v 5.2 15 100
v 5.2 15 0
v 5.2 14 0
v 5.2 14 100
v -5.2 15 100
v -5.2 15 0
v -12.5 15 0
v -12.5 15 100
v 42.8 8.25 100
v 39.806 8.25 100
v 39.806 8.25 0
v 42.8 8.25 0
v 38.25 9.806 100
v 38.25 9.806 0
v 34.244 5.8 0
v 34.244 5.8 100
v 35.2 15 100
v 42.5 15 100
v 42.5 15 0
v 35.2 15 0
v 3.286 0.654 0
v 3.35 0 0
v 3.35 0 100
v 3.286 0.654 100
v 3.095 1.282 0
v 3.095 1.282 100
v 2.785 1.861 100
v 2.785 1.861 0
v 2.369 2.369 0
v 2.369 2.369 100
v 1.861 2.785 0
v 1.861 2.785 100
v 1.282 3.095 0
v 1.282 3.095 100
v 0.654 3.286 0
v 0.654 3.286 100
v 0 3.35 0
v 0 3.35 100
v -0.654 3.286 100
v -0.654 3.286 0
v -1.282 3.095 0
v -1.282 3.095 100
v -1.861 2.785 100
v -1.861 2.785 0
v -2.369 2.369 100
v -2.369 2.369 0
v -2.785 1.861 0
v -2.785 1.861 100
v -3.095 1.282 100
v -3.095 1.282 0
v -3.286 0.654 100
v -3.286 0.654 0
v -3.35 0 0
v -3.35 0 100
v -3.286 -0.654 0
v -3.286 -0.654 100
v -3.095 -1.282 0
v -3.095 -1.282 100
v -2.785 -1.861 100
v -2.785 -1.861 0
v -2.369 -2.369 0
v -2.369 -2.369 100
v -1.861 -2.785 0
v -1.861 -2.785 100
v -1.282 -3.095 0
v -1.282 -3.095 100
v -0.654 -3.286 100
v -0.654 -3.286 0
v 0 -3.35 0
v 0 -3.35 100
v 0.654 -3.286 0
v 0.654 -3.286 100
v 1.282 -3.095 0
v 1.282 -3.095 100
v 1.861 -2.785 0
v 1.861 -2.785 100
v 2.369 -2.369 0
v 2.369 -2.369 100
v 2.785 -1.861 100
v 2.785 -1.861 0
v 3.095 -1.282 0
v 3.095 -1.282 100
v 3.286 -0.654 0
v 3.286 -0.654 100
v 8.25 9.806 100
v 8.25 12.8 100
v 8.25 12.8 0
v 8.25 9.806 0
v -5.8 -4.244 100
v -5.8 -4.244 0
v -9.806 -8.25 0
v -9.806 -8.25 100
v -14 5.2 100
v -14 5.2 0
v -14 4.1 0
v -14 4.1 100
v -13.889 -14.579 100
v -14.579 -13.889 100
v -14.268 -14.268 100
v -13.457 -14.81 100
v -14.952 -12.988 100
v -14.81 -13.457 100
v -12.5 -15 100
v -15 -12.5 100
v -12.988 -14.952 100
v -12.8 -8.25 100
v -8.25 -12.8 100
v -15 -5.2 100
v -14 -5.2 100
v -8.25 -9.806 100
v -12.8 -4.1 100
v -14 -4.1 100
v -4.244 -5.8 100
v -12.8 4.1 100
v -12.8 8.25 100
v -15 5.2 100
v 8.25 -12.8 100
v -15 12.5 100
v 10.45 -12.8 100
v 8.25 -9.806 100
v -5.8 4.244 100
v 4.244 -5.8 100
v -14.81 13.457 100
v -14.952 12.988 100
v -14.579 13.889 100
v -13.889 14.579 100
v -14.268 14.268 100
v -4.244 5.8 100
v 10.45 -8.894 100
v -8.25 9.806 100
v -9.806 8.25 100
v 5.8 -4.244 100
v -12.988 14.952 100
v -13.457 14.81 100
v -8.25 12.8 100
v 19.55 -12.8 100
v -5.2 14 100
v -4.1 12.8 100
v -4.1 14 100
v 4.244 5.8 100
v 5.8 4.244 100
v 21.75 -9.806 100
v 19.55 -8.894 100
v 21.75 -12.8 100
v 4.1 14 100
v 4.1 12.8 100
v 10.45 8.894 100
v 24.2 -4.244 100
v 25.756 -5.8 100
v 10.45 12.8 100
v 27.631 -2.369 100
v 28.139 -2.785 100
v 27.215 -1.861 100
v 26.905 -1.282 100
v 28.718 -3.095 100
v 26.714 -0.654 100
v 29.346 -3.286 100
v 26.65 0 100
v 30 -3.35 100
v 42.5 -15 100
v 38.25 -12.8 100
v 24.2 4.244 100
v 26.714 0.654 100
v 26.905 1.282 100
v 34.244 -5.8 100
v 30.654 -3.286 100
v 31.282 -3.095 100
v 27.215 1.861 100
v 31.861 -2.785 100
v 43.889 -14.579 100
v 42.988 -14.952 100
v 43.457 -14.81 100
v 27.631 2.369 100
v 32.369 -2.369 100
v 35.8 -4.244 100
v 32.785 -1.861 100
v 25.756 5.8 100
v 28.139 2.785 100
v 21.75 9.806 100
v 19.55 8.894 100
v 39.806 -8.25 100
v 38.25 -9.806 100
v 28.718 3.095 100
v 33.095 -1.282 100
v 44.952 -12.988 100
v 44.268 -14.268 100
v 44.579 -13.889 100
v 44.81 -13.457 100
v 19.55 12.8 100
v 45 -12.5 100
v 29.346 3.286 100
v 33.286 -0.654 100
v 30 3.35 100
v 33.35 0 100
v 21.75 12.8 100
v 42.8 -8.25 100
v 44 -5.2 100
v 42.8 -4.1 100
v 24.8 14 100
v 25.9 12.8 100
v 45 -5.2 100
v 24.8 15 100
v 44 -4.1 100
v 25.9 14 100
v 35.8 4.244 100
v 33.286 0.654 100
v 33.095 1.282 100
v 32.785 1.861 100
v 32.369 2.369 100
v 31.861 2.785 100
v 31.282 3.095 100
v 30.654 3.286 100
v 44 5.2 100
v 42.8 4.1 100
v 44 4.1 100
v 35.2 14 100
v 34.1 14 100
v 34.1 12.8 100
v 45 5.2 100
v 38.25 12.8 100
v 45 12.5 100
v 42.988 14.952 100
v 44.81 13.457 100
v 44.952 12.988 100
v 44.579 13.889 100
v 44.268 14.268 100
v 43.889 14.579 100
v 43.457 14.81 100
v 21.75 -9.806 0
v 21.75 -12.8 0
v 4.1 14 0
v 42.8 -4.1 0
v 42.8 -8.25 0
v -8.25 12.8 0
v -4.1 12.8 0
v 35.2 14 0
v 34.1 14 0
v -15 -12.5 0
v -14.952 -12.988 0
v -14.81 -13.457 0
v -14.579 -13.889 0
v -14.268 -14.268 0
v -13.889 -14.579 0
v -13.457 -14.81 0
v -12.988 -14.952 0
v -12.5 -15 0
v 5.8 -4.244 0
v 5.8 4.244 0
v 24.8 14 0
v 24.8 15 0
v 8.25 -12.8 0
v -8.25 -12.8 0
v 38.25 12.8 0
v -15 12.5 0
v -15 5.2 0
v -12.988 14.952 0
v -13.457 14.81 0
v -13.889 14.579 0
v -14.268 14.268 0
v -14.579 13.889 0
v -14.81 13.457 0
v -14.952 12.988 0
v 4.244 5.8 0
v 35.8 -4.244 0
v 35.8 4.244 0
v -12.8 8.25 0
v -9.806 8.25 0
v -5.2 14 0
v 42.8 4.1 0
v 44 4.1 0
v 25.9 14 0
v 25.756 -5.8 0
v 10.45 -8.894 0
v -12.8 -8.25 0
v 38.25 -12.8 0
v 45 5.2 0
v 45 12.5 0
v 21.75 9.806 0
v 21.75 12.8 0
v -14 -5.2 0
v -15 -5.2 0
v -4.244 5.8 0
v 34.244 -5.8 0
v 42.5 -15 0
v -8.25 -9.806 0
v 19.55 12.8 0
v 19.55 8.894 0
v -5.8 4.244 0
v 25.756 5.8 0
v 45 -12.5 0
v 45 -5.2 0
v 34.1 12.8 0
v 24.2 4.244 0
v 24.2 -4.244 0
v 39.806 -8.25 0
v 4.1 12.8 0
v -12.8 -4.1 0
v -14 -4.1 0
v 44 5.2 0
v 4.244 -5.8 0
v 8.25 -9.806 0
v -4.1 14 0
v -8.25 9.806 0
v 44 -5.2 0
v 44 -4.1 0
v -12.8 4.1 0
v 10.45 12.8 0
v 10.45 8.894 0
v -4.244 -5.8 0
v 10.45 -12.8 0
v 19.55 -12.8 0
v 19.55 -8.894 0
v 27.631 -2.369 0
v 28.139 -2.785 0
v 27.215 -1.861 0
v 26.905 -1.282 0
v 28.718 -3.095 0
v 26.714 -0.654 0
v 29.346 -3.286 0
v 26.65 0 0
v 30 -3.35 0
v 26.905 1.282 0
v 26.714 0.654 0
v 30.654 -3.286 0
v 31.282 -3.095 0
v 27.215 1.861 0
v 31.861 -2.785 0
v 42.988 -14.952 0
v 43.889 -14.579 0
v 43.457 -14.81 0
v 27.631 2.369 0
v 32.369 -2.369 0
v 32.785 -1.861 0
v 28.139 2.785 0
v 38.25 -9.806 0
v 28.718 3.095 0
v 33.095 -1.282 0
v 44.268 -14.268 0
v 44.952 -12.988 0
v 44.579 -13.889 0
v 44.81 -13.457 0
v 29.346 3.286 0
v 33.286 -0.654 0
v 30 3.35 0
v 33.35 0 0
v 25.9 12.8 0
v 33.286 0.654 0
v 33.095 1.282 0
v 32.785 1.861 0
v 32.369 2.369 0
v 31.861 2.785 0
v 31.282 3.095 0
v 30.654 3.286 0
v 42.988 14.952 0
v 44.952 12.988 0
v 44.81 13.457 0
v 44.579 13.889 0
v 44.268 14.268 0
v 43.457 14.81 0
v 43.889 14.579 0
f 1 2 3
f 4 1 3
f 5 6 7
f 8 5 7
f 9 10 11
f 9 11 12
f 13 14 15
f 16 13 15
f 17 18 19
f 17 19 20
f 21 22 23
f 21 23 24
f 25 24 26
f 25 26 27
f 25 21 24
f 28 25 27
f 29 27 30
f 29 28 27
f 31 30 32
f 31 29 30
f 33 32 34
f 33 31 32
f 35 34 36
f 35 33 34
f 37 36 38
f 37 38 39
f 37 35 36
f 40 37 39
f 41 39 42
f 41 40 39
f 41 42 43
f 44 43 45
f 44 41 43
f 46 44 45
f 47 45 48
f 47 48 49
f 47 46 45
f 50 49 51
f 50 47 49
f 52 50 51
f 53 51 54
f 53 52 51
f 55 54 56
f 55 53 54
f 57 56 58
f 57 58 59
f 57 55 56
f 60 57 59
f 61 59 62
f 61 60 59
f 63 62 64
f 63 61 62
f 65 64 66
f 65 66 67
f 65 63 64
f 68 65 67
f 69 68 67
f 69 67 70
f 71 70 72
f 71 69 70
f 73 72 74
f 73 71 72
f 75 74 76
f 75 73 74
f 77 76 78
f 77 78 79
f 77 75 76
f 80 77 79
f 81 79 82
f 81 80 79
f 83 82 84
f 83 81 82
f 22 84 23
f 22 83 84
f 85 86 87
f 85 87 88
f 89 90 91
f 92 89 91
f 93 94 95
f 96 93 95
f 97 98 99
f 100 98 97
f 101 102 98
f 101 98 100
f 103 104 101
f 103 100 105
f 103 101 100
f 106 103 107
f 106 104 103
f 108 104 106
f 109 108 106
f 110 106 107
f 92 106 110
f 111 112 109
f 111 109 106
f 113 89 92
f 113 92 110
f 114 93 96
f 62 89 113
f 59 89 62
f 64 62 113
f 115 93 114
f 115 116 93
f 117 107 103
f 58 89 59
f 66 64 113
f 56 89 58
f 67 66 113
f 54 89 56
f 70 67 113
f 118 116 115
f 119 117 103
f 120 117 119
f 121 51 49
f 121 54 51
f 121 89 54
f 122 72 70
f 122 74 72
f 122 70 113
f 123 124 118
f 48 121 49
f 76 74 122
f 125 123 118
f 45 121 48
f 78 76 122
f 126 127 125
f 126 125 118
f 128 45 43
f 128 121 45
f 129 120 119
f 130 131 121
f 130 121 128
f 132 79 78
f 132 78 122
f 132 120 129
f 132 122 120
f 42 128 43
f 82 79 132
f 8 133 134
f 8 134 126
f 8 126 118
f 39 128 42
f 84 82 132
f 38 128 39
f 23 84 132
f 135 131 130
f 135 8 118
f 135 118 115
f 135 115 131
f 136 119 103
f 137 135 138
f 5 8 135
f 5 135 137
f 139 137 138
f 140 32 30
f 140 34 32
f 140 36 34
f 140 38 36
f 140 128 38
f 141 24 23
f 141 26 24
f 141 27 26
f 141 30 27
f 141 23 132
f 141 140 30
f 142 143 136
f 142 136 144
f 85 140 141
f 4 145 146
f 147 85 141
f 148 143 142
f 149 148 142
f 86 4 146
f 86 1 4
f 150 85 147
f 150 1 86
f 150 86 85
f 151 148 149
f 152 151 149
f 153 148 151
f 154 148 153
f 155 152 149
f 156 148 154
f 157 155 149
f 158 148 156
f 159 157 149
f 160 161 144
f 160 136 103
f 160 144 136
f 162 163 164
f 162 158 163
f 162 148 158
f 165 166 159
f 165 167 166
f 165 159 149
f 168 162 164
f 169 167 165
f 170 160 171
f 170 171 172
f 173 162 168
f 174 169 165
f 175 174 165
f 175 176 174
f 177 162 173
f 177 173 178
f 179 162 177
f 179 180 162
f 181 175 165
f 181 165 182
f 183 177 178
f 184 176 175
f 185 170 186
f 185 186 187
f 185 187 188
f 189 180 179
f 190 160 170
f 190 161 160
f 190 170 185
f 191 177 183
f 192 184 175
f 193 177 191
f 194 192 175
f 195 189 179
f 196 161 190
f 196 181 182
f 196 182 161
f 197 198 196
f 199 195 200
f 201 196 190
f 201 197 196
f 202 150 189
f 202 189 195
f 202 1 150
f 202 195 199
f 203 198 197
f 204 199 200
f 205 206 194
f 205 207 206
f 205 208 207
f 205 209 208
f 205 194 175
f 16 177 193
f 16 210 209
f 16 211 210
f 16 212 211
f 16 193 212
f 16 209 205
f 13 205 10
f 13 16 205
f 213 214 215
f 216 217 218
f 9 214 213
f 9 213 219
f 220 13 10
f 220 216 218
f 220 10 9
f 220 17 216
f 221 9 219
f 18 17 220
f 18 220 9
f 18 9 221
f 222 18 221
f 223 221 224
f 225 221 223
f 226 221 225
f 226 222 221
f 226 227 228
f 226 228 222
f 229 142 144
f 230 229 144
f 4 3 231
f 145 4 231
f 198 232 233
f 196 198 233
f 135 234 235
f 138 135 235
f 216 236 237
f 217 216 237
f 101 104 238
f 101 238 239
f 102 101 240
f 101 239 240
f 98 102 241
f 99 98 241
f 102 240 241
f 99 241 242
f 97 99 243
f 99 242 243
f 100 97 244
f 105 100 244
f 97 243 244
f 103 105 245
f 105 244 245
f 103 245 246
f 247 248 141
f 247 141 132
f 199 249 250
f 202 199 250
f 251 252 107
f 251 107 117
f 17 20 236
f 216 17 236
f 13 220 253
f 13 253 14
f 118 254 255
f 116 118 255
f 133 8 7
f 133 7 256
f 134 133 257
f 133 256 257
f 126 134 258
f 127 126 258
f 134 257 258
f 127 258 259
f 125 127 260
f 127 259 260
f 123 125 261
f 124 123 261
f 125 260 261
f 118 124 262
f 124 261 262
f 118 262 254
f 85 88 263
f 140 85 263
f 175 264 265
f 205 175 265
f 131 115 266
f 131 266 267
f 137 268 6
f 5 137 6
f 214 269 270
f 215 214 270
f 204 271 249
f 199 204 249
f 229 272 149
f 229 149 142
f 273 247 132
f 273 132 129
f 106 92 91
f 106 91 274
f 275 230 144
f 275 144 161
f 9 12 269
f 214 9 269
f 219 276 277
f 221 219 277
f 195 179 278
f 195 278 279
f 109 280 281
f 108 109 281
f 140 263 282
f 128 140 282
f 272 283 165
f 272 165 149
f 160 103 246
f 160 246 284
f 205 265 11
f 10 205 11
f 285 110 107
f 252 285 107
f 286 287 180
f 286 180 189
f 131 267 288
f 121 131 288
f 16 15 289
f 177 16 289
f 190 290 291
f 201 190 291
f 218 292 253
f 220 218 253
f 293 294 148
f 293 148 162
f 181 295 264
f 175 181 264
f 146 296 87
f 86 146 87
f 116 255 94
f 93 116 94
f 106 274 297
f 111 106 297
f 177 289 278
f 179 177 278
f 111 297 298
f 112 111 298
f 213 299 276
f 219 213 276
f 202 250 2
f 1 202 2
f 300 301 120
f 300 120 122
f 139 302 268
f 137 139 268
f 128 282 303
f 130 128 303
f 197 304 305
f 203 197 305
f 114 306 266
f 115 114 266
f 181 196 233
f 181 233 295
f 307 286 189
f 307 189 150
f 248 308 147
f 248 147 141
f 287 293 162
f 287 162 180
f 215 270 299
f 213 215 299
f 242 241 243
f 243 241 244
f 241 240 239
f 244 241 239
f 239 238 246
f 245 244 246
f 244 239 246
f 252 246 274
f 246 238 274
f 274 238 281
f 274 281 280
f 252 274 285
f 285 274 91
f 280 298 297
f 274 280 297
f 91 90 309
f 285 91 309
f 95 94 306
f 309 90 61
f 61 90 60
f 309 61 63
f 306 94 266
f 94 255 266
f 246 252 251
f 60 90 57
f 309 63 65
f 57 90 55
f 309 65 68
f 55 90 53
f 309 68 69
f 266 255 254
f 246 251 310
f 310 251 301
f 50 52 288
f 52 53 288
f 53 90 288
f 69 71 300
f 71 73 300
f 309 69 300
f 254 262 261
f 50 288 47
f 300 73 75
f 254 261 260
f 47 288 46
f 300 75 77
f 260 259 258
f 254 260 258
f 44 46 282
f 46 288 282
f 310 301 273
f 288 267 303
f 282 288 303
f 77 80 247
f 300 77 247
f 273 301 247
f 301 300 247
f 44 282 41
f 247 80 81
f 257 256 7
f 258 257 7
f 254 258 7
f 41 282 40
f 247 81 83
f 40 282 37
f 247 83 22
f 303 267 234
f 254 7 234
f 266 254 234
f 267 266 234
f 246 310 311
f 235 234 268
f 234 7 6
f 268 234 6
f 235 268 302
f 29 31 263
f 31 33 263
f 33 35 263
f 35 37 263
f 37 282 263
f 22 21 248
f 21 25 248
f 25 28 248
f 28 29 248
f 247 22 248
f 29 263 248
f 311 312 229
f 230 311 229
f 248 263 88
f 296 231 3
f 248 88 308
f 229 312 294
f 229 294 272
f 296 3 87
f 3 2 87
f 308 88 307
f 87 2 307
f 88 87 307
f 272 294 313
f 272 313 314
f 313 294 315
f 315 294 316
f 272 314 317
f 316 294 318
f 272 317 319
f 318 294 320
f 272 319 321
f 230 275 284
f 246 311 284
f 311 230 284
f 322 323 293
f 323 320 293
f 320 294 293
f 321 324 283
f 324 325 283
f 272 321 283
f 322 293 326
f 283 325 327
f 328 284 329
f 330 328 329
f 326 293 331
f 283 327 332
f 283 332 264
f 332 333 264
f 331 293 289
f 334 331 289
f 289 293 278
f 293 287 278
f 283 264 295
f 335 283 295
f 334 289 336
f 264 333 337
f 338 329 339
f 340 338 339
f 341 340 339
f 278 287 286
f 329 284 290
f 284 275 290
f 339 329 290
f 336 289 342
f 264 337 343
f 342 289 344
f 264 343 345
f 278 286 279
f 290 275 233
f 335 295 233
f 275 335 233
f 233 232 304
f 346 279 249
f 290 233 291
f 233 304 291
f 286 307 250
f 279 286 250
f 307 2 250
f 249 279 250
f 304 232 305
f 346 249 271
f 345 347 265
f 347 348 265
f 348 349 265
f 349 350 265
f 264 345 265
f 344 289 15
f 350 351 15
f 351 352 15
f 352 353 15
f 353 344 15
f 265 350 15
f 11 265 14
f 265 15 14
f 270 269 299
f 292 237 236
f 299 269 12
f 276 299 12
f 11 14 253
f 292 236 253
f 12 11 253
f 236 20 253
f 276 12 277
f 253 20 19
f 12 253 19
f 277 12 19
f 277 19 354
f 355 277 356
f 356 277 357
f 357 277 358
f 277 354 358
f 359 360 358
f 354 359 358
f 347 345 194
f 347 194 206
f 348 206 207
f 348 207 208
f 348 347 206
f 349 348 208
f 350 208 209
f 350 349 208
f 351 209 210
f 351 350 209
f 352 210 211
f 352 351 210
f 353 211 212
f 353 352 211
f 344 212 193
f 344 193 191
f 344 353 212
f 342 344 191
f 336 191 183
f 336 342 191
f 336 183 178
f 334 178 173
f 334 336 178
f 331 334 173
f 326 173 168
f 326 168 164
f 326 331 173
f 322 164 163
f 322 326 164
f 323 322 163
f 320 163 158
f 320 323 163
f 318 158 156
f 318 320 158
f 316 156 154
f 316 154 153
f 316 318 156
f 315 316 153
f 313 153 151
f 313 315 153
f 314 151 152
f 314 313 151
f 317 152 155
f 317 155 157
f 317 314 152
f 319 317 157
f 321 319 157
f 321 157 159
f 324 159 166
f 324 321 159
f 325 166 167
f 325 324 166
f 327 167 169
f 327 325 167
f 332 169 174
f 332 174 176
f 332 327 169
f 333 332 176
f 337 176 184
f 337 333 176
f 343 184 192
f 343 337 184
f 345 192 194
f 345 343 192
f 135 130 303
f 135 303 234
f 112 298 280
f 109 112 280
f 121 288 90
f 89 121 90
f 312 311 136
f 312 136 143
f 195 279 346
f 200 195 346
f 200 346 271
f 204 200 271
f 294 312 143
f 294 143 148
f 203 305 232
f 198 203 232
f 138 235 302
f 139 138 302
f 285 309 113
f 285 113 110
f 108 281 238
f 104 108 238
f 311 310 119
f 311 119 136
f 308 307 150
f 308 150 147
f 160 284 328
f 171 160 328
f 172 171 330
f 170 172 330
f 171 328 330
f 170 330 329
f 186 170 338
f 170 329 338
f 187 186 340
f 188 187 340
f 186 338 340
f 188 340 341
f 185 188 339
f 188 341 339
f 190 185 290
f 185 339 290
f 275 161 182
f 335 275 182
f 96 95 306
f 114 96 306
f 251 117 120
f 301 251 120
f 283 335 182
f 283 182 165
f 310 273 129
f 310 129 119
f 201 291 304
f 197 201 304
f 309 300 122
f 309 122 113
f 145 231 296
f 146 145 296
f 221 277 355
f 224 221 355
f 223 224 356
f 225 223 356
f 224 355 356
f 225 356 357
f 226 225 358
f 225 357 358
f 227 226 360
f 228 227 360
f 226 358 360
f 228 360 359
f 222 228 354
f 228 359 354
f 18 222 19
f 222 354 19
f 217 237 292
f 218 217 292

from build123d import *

# Parameters (mm, degrees)
SKETCH_1_R      = 3.35
EXTRUDE_1_DEPTH = 100


with BuildPart() as part:
    # 草图1 → 凸台-拉伸1 (new body)
    with BuildSketch(Plane.XY):
        with BuildLine():
            Line((-5.8, -4.244365081), (-9.805634919, -8.25))
            Line((-9.805634919, -8.25), (-12.8, -8.25))
            Line((-12.8, -8.25), (-12.8, -4.1))
            Line((-12.8, -4.1), (-14, -4.1))
            Line((-14, -4.1), (-14, -5.2))
            Line((-14, -5.2), (-15, -5.2))
            Line((-15, -5.2), (-15, -12.5))
            ThreePointArc((-15, -12.5), (-14.267766953, -14.267766953), (-12.5, -15))
            Line((-12.5, -15), (42.5, -15))
            ThreePointArc((42.5, -15), (44.267766953, -14.267766953), (45, -12.5))
            Line((45, -12.5), (45, -5.2))
            Line((45, -5.2), (44, -5.2))
            Line((44, -5.2), (44, -4.1))
            Line((44, -4.1), (42.8, -4.1))
            Line((42.8, -4.1), (42.8, -8.25))
            Line((42.8, -8.25), (39.805634919, -8.25))
            Line((39.805634919, -8.25), (35.8, -4.244365081))
            Line((35.8, -4.244365081), (35.8, 4.244365081))
            Line((35.8, 4.244365081), (39.805634919, 8.25))
            Line((39.805634919, 8.25), (42.8, 8.25))
            Line((42.8, 8.25), (42.8, 4.1))
            Line((42.8, 4.1), (44, 4.1))
            Line((44, 4.1), (44, 5.2))
            Line((44, 5.2), (45, 5.2))
            Line((45, 5.2), (45, 12.5))
            ThreePointArc((45, 12.5), (44.267766953, 14.267766953), (42.5, 15))
            Line((42.5, 15), (35.2, 15))
            Line((35.2, 15), (35.2, 14))
            Line((35.2, 14), (34.1, 14))
            Line((34.1, 14), (34.1, 12.8))
            Line((34.1, 12.8), (38.25, 12.8))
            Line((38.25, 12.8), (38.25, 9.805634919))
            Line((38.25, 9.805634919), (34.244365081, 5.8))
            Line((34.244365081, 5.8), (25.755634919, 5.8))
            Line((25.755634919, 5.8), (21.75, 9.805634919))
            Line((21.75, 9.805634919), (21.75, 12.8))
            Line((21.75, 12.8), (25.9, 12.8))
            Line((25.9, 12.8), (25.9, 14))
            Line((25.9, 14), (24.8, 14))
            Line((24.8, 14), (24.8, 15))
            Line((24.8, 15), (5.2, 15))
            Line((5.2, 15), (5.2, 14))
            Line((5.2, 14), (4.1, 14))
            Line((4.1, 14), (4.1, 12.8))
            Line((4.1, 12.8), (8.25, 12.8))
            Line((8.25, 12.8), (8.25, 9.805634919))
            Line((8.25, 9.805634919), (4.244365081, 5.8))
            Line((4.244365081, 5.8), (-4.244365081, 5.8))
            Line((-4.244365081, 5.8), (-8.25, 9.805634919))
            Line((-8.25, 9.805634919), (-8.25, 12.8))
            Line((-8.25, 12.8), (-4.1, 12.8))
            Line((-4.1, 12.8), (-4.1, 14))
            Line((-4.1, 14), (-5.2, 14))
            Line((-5.2, 14), (-5.2, 15))
            Line((-5.2, 15), (-12.5, 15))
            ThreePointArc((-12.5, 15), (-14.267766953, 14.267766953), (-15, 12.5))
            Line((-15, 12.5), (-15, 5.2))
            Line((-15, 5.2), (-14, 5.2))
            Line((-14, 5.2), (-14, 4.1))
            Line((-14, 4.1), (-12.8, 4.1))
            Line((-12.8, 4.1), (-12.8, 8.25))
            Line((-12.8, 8.25), (-9.805634919, 8.25))
            Line((-9.805634919, 8.25), (-5.8, 4.244365081))
            Line((-5.8, 4.244365081), (-5.8, -4.244365081))
        make_face()
        with Locations((30, 0)):
            Circle(SKETCH_1_R, mode=Mode.SUBTRACT)
        Circle(SKETCH_1_R, mode=Mode.SUBTRACT)
        Polygon((38.25, -9.805634919), (34.244365081, -5.8), (25.755634919, -5.8), (21.75, -9.805634919), (21.75, -12.8), (38.25, -12.8), align=None, mode=Mode.SUBTRACT)
        Polygon((8.25, -9.805634919), (4.244365081, -5.8), (-4.244365081, -5.8), (-8.25, -9.805634919), (-8.25, -12.8), (8.25, -12.8), align=None, mode=Mode.SUBTRACT)
        Polygon((19.55, 12.8), (10.45, 12.8), (10.45, 8.894365081), (5.8, 4.244365081), (5.8, -4.244365081), (10.45, -8.894365081), (10.45, -12.8), (19.55, -12.8), (19.55, -8.894365081), (24.2, -4.244365081), (24.2, 4.244365081), (19.55, 8.894365081), align=None, mode=Mode.SUBTRACT)
    extrude(amount=EXTRUDE_1_DEPTH)


solid = part.part
